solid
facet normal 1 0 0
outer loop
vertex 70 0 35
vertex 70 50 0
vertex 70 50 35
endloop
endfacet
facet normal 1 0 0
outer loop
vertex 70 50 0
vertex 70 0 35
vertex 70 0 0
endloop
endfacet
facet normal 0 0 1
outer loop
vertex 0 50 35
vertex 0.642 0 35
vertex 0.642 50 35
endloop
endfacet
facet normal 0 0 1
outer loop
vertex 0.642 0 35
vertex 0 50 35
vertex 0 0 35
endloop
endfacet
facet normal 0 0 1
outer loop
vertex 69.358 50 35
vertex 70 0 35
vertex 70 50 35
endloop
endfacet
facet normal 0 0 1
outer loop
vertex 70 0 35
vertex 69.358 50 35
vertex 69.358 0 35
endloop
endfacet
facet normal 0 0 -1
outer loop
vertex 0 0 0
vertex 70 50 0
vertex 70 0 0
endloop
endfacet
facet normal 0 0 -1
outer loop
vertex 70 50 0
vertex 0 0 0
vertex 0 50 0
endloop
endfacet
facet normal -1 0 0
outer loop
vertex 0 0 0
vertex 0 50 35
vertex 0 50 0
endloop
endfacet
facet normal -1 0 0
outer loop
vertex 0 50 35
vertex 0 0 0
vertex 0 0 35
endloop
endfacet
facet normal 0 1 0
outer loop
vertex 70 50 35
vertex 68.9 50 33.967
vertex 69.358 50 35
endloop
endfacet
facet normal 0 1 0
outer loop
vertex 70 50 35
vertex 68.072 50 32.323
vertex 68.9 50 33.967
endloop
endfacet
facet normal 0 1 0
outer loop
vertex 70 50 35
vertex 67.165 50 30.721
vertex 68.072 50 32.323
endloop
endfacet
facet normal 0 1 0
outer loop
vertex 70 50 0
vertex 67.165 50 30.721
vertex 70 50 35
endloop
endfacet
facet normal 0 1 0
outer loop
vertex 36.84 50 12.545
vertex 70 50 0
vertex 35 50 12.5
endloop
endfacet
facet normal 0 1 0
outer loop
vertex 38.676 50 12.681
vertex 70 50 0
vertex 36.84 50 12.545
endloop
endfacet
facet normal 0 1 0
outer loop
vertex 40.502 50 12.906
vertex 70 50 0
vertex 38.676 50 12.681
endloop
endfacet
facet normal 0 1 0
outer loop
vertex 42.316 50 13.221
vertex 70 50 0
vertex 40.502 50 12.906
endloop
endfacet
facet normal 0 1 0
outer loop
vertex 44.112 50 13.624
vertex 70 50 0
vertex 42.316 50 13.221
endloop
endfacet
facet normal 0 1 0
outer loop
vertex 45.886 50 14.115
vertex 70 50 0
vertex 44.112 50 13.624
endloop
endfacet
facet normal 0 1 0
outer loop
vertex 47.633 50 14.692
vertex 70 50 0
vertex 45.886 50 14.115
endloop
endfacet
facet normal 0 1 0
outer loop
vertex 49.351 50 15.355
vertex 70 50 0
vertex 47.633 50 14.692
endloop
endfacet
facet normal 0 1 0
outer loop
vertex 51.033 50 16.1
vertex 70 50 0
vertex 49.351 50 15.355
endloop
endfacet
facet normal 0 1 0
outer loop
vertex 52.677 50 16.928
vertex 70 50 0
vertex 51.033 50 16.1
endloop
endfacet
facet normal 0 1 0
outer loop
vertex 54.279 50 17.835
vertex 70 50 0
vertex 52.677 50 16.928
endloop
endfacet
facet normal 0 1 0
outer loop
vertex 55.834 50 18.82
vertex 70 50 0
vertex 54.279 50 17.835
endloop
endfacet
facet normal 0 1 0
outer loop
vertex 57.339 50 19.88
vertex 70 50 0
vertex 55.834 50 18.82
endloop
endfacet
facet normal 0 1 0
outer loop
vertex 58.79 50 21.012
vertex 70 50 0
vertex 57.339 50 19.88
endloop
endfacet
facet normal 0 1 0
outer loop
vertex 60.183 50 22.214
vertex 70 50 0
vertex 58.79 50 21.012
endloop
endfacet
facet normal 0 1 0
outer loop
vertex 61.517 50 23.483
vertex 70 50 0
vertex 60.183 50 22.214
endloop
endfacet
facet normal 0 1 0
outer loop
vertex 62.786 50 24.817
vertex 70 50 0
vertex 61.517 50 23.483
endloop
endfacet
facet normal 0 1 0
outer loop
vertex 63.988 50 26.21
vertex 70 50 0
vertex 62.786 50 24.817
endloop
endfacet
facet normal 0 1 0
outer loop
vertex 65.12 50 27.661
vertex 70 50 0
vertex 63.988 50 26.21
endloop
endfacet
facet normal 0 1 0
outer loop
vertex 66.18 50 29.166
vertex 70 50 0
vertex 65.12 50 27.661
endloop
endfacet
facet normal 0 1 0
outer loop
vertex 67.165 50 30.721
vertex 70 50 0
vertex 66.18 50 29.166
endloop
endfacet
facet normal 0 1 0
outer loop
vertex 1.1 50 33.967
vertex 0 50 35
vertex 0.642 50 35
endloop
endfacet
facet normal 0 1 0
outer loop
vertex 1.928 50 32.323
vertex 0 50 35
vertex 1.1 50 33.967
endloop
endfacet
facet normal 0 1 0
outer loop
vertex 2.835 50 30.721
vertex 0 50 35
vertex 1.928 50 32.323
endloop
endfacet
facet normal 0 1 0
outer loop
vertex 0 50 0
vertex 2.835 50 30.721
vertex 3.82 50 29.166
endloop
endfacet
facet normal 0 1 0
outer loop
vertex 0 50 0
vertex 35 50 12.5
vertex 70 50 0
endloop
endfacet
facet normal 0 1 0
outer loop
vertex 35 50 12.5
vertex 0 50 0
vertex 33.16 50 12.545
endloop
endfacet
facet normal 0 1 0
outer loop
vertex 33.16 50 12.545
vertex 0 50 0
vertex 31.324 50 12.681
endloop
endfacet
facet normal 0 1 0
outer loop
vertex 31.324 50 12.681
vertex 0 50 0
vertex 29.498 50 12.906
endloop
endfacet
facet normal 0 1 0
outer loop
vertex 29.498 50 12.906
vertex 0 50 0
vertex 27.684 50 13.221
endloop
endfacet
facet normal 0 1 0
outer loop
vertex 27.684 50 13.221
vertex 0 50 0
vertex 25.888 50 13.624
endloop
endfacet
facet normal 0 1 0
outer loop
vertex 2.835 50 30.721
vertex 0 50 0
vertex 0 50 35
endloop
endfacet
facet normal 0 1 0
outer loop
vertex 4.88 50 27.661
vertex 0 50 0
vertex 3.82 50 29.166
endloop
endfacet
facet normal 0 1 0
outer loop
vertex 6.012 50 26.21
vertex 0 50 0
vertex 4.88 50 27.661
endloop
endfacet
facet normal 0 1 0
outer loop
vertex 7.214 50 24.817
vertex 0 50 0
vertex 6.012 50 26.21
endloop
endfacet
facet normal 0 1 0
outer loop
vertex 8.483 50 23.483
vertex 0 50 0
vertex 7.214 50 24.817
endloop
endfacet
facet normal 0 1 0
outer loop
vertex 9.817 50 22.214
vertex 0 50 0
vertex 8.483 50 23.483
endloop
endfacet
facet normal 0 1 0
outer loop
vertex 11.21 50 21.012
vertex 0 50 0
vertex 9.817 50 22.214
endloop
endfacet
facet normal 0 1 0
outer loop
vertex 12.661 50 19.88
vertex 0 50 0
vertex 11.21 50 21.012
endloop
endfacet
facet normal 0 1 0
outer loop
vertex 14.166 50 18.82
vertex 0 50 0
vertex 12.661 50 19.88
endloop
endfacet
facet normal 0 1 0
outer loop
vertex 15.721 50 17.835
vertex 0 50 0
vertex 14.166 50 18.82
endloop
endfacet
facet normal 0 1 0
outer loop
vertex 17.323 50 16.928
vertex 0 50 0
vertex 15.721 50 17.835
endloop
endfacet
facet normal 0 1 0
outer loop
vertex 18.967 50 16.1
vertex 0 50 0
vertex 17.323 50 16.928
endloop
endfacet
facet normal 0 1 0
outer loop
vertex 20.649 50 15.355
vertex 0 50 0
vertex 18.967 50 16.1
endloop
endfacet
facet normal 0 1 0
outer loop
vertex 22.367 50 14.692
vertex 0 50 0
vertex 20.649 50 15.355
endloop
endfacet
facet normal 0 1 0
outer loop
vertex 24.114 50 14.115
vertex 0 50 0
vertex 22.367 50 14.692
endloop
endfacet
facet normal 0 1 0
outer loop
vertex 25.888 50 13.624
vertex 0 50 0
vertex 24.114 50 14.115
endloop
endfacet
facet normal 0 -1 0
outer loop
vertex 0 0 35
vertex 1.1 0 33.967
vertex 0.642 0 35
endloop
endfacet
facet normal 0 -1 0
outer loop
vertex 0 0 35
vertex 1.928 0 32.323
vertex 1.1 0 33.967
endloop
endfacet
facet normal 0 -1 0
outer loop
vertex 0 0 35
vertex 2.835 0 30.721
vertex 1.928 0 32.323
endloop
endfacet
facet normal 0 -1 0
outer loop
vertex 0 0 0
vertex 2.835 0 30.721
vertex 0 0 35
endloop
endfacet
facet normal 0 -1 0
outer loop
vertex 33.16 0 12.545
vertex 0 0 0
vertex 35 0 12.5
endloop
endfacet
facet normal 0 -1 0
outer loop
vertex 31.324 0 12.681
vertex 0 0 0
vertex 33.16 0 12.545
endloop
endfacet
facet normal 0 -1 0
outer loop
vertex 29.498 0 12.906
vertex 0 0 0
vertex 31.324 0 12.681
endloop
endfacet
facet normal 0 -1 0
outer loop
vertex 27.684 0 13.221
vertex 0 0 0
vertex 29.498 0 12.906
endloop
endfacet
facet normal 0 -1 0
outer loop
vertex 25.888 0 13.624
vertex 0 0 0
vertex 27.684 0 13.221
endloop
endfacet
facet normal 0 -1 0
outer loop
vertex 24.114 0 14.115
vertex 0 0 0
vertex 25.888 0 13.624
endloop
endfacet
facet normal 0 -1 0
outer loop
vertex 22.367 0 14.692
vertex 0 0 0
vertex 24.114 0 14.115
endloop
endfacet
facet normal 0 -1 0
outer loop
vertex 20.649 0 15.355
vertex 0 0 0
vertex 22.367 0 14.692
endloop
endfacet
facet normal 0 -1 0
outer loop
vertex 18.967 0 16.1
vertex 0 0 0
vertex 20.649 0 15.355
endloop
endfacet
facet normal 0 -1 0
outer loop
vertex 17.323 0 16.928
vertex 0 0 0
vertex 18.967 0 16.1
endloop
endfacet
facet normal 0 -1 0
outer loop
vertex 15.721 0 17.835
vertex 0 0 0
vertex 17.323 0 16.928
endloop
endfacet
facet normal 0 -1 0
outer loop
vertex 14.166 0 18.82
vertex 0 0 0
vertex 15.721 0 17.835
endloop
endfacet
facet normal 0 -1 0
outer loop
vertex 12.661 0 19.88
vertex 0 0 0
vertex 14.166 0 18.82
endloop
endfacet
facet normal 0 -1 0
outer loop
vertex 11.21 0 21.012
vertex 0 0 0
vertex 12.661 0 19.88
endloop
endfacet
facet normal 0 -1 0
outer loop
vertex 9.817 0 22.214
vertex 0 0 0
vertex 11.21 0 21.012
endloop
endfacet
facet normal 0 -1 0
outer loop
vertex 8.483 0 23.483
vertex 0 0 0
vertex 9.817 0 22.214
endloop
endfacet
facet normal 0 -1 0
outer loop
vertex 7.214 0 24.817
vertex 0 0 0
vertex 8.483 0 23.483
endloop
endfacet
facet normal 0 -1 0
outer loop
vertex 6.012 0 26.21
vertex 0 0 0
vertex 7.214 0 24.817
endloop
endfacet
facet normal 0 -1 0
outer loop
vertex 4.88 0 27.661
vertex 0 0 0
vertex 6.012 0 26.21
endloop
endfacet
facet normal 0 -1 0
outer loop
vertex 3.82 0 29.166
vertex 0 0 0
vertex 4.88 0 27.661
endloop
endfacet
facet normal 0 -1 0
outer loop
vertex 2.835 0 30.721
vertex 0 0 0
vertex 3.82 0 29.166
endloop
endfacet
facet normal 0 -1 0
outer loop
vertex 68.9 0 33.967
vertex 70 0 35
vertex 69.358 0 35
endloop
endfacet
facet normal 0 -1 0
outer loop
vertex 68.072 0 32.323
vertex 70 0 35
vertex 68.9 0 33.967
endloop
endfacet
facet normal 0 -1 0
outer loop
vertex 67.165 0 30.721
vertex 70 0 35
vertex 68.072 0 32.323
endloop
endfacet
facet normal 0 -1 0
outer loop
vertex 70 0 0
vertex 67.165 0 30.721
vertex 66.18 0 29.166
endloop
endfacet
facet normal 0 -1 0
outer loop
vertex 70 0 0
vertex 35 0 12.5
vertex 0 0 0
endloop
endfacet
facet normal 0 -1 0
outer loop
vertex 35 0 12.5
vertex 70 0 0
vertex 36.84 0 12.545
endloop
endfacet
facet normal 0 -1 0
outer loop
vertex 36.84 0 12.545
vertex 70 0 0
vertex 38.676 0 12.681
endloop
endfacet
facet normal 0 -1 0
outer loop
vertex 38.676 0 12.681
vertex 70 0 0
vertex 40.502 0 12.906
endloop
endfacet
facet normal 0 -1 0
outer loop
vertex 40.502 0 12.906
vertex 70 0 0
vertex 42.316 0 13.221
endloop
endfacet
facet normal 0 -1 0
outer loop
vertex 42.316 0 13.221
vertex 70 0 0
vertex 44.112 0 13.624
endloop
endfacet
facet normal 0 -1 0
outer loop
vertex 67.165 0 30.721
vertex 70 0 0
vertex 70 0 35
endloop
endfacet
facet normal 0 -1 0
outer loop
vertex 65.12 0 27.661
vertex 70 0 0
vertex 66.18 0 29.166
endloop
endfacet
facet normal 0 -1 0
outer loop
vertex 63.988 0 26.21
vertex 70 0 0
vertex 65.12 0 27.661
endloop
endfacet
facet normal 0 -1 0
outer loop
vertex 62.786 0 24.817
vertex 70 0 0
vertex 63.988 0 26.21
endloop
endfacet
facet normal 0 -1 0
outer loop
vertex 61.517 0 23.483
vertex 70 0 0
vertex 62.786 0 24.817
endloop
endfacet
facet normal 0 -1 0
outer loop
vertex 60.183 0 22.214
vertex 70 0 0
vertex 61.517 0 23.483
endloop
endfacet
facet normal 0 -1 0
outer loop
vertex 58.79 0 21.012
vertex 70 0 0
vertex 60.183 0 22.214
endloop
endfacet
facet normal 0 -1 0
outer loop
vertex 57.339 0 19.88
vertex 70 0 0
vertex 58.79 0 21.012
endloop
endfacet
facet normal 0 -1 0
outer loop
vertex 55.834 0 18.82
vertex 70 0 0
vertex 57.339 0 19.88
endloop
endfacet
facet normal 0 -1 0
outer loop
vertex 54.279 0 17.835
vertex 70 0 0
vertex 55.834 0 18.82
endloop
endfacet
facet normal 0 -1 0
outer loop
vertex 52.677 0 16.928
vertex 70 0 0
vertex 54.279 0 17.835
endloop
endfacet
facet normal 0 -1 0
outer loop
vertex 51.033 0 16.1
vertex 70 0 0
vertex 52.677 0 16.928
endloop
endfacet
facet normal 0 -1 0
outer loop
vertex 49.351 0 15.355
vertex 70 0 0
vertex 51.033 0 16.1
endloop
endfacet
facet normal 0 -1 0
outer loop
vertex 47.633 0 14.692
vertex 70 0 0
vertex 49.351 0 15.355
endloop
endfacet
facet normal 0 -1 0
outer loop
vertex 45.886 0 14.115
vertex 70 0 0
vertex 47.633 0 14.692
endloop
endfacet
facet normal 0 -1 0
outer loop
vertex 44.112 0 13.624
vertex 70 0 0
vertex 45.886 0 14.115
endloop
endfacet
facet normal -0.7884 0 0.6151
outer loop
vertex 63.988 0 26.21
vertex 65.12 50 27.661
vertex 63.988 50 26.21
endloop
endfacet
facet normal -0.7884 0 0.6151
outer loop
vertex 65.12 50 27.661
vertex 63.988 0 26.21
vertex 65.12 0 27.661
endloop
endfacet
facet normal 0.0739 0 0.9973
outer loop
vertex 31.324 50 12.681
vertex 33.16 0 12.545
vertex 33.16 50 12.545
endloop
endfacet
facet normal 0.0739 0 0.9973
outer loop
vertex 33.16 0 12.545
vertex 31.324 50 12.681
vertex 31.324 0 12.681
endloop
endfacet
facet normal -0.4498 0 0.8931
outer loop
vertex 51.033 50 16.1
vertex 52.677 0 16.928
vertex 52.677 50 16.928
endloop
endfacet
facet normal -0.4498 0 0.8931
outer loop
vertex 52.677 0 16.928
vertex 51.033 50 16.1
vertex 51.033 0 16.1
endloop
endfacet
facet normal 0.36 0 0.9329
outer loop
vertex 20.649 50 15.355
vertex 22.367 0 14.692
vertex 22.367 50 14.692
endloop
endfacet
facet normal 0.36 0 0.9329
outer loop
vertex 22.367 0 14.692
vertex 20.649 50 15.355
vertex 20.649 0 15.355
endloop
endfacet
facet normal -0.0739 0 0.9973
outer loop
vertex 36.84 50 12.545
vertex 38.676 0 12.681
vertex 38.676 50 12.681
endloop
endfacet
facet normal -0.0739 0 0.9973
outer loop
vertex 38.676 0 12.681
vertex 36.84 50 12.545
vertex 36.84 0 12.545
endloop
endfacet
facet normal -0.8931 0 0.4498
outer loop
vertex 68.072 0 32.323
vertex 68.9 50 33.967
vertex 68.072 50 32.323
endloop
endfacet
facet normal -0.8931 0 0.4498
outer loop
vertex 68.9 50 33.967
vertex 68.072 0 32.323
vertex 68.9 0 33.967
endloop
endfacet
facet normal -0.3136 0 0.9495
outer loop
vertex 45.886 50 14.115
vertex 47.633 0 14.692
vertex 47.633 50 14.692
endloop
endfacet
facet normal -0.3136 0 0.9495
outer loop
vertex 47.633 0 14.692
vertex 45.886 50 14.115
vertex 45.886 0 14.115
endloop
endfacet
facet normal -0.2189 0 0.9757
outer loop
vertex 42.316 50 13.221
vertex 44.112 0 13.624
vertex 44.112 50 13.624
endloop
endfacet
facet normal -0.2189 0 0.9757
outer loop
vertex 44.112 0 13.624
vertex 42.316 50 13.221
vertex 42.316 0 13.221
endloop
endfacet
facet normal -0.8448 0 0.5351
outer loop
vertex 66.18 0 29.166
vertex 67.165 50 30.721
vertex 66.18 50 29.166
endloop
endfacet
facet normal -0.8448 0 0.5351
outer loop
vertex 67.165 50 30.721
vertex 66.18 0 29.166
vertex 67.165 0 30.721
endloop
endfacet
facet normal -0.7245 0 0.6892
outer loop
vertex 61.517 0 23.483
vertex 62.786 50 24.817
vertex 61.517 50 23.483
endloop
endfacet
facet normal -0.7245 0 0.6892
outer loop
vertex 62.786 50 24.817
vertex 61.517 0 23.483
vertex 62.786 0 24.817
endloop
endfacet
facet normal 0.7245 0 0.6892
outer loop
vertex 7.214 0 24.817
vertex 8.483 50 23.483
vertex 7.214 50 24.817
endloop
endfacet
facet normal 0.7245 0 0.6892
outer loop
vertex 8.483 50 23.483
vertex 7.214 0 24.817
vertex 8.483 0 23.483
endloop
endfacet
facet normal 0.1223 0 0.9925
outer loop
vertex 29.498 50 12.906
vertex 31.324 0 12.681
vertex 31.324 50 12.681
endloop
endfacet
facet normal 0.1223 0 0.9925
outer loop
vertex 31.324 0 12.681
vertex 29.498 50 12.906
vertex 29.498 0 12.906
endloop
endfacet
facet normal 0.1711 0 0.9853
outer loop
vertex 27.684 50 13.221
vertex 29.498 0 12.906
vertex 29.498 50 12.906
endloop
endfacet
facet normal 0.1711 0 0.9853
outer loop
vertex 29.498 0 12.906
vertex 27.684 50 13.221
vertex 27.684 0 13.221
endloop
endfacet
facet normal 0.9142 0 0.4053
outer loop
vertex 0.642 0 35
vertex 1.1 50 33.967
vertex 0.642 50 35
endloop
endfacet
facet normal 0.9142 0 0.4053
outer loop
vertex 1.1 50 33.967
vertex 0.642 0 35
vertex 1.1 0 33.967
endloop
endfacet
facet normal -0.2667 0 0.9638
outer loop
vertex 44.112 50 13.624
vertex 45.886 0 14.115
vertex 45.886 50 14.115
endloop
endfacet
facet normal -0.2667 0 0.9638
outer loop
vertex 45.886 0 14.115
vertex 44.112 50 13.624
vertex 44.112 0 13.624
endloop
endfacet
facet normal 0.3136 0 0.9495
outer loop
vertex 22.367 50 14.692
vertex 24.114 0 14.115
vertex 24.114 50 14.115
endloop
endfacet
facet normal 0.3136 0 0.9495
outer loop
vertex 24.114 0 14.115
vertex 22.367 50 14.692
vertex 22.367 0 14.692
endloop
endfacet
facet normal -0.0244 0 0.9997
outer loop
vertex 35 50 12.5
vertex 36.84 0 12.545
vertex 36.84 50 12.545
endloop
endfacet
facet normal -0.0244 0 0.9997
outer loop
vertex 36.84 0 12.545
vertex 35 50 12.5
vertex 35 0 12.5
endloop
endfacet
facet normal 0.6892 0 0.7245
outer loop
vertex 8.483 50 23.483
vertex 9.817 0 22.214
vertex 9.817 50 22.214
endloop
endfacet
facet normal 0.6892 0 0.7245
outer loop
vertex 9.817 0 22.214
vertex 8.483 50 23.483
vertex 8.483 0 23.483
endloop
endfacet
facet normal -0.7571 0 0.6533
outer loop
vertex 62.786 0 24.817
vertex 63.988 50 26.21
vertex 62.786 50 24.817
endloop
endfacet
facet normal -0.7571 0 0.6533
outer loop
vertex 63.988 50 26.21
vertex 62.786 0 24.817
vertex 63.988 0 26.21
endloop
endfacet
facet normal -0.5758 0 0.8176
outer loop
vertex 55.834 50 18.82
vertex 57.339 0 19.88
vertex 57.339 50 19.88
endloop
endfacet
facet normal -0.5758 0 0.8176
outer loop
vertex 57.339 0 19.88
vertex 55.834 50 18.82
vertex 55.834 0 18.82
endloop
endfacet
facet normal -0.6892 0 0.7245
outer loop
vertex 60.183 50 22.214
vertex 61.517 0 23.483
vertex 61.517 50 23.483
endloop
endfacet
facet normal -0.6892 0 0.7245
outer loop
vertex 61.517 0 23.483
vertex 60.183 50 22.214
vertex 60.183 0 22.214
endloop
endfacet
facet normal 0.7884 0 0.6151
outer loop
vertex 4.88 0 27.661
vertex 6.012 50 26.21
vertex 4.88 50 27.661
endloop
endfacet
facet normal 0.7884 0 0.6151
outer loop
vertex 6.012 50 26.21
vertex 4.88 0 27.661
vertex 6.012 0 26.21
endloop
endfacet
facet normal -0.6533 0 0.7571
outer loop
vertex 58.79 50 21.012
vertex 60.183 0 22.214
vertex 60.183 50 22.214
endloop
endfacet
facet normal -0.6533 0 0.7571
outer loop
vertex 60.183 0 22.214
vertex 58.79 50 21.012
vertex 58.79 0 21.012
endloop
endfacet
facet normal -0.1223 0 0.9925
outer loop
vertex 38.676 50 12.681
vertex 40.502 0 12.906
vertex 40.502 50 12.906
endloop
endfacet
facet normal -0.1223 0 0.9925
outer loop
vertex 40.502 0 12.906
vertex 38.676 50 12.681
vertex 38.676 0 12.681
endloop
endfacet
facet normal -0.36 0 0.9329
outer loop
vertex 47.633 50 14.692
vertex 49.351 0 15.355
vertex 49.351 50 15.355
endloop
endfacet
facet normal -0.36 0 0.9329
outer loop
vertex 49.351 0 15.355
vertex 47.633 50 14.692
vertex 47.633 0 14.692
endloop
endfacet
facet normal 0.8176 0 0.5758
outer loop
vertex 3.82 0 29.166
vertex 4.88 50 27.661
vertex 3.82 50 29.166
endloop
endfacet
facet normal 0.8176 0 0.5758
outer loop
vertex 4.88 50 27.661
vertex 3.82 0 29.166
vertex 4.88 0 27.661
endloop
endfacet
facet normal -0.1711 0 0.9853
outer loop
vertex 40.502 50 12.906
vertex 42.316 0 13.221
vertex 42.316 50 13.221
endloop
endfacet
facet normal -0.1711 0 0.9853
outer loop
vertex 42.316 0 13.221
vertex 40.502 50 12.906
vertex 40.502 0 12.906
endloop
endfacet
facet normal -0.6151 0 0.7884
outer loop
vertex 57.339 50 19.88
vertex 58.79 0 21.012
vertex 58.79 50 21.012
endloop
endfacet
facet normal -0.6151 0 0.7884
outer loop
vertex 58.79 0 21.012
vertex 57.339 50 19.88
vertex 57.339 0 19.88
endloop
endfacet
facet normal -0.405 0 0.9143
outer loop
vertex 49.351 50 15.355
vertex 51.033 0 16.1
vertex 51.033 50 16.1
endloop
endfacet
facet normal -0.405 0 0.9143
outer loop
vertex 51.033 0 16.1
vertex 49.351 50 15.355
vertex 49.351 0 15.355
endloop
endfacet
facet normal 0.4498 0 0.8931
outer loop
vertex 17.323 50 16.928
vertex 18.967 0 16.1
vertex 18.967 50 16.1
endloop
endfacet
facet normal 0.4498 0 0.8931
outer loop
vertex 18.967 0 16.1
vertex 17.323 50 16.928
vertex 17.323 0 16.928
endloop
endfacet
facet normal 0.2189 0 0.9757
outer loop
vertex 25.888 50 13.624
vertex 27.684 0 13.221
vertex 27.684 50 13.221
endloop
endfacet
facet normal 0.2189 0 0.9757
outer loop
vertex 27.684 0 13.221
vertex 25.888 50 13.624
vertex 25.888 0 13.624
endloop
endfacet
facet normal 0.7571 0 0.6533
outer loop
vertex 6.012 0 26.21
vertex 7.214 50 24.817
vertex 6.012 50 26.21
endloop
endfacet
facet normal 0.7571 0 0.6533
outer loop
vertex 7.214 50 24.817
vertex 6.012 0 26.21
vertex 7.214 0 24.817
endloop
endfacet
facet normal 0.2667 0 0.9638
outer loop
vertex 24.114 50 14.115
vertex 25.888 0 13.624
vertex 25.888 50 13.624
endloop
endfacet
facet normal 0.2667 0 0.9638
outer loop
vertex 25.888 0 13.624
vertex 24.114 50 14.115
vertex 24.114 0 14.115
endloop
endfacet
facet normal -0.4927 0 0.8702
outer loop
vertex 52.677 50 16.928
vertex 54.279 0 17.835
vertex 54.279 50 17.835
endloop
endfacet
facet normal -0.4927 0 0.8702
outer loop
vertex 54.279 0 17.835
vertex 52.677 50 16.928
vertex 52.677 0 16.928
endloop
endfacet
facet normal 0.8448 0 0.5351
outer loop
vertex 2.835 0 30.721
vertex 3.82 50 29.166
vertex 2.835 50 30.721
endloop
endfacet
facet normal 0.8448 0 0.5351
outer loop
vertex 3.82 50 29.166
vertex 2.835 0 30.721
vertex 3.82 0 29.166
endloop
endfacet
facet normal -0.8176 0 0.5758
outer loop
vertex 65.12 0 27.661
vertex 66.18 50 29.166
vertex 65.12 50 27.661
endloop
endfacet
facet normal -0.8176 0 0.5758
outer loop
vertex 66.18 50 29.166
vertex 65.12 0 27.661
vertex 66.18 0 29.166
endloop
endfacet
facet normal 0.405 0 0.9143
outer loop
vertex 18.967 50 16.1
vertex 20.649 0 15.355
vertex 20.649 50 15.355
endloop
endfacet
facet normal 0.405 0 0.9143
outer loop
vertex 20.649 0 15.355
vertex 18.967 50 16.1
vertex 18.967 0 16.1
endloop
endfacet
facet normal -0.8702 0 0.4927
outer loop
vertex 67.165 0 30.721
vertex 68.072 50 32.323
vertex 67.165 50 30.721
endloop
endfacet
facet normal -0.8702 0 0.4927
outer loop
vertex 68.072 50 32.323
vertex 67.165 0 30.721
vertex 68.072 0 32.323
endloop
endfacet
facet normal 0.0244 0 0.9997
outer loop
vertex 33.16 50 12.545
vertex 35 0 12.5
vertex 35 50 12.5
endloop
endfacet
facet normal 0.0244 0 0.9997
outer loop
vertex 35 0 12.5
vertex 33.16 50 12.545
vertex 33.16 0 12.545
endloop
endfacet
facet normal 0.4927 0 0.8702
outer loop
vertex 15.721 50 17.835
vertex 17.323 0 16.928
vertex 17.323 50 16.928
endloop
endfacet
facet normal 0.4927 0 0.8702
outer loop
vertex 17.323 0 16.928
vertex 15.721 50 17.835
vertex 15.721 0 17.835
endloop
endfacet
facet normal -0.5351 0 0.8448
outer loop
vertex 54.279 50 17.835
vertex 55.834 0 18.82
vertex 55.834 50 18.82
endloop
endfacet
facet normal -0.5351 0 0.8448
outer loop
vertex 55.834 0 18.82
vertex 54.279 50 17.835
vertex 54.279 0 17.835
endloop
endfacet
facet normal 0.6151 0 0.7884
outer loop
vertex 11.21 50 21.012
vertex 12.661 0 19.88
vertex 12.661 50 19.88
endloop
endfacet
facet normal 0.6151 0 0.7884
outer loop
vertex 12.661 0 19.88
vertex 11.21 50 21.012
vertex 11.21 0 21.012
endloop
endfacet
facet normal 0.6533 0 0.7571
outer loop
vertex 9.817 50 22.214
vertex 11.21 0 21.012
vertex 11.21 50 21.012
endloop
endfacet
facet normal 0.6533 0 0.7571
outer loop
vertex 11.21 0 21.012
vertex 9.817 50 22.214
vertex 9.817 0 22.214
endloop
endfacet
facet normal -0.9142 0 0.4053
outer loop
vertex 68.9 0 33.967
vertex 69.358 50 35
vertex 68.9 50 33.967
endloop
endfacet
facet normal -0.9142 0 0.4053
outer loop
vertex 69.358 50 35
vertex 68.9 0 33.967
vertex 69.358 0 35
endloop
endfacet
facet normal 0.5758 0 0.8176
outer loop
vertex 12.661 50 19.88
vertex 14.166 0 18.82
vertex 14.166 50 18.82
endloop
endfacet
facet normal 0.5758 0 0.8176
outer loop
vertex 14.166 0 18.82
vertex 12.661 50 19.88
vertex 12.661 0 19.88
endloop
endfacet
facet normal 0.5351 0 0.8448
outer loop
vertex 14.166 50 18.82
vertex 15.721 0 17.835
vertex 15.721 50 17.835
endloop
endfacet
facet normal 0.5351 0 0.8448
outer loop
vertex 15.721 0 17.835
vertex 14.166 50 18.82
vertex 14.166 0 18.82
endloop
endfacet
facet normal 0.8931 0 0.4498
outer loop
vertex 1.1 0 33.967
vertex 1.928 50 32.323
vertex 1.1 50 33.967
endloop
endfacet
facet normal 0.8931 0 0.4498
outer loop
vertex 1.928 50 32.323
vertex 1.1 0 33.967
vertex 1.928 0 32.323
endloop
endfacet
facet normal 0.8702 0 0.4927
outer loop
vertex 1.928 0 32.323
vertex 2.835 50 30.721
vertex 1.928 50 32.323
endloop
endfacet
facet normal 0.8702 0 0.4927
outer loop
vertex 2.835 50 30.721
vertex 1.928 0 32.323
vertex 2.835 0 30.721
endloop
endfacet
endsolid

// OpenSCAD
// === parameters ===
W  = 70;       // 50mm
H  = 50;       // 50mm
L  = 35;      // 100mm
hole_d = 75;   // 50mm

$fn = 128;       // 円の滑らかさ

difference() {
  // 5cm x 5cm x 10cm の直方体（中心合わせ）
  cube([W, H, L]);

  // 側面（50×100 の面）に対して直径5cmの円柱で貫通穴を開ける
  // 直方体の法線方向（Y軸）に沿うように、Z軸向き円柱をX軸回りに90°回転
  // 厚みH=50mmより少し長い高さを指定して確実に貫通
  rotate([90,0, 0])  // Z軸 → Y軸に向ける
    translate([35,50,-(W+8)])
    cylinder(d = hole_d, h = W + 10);
}
